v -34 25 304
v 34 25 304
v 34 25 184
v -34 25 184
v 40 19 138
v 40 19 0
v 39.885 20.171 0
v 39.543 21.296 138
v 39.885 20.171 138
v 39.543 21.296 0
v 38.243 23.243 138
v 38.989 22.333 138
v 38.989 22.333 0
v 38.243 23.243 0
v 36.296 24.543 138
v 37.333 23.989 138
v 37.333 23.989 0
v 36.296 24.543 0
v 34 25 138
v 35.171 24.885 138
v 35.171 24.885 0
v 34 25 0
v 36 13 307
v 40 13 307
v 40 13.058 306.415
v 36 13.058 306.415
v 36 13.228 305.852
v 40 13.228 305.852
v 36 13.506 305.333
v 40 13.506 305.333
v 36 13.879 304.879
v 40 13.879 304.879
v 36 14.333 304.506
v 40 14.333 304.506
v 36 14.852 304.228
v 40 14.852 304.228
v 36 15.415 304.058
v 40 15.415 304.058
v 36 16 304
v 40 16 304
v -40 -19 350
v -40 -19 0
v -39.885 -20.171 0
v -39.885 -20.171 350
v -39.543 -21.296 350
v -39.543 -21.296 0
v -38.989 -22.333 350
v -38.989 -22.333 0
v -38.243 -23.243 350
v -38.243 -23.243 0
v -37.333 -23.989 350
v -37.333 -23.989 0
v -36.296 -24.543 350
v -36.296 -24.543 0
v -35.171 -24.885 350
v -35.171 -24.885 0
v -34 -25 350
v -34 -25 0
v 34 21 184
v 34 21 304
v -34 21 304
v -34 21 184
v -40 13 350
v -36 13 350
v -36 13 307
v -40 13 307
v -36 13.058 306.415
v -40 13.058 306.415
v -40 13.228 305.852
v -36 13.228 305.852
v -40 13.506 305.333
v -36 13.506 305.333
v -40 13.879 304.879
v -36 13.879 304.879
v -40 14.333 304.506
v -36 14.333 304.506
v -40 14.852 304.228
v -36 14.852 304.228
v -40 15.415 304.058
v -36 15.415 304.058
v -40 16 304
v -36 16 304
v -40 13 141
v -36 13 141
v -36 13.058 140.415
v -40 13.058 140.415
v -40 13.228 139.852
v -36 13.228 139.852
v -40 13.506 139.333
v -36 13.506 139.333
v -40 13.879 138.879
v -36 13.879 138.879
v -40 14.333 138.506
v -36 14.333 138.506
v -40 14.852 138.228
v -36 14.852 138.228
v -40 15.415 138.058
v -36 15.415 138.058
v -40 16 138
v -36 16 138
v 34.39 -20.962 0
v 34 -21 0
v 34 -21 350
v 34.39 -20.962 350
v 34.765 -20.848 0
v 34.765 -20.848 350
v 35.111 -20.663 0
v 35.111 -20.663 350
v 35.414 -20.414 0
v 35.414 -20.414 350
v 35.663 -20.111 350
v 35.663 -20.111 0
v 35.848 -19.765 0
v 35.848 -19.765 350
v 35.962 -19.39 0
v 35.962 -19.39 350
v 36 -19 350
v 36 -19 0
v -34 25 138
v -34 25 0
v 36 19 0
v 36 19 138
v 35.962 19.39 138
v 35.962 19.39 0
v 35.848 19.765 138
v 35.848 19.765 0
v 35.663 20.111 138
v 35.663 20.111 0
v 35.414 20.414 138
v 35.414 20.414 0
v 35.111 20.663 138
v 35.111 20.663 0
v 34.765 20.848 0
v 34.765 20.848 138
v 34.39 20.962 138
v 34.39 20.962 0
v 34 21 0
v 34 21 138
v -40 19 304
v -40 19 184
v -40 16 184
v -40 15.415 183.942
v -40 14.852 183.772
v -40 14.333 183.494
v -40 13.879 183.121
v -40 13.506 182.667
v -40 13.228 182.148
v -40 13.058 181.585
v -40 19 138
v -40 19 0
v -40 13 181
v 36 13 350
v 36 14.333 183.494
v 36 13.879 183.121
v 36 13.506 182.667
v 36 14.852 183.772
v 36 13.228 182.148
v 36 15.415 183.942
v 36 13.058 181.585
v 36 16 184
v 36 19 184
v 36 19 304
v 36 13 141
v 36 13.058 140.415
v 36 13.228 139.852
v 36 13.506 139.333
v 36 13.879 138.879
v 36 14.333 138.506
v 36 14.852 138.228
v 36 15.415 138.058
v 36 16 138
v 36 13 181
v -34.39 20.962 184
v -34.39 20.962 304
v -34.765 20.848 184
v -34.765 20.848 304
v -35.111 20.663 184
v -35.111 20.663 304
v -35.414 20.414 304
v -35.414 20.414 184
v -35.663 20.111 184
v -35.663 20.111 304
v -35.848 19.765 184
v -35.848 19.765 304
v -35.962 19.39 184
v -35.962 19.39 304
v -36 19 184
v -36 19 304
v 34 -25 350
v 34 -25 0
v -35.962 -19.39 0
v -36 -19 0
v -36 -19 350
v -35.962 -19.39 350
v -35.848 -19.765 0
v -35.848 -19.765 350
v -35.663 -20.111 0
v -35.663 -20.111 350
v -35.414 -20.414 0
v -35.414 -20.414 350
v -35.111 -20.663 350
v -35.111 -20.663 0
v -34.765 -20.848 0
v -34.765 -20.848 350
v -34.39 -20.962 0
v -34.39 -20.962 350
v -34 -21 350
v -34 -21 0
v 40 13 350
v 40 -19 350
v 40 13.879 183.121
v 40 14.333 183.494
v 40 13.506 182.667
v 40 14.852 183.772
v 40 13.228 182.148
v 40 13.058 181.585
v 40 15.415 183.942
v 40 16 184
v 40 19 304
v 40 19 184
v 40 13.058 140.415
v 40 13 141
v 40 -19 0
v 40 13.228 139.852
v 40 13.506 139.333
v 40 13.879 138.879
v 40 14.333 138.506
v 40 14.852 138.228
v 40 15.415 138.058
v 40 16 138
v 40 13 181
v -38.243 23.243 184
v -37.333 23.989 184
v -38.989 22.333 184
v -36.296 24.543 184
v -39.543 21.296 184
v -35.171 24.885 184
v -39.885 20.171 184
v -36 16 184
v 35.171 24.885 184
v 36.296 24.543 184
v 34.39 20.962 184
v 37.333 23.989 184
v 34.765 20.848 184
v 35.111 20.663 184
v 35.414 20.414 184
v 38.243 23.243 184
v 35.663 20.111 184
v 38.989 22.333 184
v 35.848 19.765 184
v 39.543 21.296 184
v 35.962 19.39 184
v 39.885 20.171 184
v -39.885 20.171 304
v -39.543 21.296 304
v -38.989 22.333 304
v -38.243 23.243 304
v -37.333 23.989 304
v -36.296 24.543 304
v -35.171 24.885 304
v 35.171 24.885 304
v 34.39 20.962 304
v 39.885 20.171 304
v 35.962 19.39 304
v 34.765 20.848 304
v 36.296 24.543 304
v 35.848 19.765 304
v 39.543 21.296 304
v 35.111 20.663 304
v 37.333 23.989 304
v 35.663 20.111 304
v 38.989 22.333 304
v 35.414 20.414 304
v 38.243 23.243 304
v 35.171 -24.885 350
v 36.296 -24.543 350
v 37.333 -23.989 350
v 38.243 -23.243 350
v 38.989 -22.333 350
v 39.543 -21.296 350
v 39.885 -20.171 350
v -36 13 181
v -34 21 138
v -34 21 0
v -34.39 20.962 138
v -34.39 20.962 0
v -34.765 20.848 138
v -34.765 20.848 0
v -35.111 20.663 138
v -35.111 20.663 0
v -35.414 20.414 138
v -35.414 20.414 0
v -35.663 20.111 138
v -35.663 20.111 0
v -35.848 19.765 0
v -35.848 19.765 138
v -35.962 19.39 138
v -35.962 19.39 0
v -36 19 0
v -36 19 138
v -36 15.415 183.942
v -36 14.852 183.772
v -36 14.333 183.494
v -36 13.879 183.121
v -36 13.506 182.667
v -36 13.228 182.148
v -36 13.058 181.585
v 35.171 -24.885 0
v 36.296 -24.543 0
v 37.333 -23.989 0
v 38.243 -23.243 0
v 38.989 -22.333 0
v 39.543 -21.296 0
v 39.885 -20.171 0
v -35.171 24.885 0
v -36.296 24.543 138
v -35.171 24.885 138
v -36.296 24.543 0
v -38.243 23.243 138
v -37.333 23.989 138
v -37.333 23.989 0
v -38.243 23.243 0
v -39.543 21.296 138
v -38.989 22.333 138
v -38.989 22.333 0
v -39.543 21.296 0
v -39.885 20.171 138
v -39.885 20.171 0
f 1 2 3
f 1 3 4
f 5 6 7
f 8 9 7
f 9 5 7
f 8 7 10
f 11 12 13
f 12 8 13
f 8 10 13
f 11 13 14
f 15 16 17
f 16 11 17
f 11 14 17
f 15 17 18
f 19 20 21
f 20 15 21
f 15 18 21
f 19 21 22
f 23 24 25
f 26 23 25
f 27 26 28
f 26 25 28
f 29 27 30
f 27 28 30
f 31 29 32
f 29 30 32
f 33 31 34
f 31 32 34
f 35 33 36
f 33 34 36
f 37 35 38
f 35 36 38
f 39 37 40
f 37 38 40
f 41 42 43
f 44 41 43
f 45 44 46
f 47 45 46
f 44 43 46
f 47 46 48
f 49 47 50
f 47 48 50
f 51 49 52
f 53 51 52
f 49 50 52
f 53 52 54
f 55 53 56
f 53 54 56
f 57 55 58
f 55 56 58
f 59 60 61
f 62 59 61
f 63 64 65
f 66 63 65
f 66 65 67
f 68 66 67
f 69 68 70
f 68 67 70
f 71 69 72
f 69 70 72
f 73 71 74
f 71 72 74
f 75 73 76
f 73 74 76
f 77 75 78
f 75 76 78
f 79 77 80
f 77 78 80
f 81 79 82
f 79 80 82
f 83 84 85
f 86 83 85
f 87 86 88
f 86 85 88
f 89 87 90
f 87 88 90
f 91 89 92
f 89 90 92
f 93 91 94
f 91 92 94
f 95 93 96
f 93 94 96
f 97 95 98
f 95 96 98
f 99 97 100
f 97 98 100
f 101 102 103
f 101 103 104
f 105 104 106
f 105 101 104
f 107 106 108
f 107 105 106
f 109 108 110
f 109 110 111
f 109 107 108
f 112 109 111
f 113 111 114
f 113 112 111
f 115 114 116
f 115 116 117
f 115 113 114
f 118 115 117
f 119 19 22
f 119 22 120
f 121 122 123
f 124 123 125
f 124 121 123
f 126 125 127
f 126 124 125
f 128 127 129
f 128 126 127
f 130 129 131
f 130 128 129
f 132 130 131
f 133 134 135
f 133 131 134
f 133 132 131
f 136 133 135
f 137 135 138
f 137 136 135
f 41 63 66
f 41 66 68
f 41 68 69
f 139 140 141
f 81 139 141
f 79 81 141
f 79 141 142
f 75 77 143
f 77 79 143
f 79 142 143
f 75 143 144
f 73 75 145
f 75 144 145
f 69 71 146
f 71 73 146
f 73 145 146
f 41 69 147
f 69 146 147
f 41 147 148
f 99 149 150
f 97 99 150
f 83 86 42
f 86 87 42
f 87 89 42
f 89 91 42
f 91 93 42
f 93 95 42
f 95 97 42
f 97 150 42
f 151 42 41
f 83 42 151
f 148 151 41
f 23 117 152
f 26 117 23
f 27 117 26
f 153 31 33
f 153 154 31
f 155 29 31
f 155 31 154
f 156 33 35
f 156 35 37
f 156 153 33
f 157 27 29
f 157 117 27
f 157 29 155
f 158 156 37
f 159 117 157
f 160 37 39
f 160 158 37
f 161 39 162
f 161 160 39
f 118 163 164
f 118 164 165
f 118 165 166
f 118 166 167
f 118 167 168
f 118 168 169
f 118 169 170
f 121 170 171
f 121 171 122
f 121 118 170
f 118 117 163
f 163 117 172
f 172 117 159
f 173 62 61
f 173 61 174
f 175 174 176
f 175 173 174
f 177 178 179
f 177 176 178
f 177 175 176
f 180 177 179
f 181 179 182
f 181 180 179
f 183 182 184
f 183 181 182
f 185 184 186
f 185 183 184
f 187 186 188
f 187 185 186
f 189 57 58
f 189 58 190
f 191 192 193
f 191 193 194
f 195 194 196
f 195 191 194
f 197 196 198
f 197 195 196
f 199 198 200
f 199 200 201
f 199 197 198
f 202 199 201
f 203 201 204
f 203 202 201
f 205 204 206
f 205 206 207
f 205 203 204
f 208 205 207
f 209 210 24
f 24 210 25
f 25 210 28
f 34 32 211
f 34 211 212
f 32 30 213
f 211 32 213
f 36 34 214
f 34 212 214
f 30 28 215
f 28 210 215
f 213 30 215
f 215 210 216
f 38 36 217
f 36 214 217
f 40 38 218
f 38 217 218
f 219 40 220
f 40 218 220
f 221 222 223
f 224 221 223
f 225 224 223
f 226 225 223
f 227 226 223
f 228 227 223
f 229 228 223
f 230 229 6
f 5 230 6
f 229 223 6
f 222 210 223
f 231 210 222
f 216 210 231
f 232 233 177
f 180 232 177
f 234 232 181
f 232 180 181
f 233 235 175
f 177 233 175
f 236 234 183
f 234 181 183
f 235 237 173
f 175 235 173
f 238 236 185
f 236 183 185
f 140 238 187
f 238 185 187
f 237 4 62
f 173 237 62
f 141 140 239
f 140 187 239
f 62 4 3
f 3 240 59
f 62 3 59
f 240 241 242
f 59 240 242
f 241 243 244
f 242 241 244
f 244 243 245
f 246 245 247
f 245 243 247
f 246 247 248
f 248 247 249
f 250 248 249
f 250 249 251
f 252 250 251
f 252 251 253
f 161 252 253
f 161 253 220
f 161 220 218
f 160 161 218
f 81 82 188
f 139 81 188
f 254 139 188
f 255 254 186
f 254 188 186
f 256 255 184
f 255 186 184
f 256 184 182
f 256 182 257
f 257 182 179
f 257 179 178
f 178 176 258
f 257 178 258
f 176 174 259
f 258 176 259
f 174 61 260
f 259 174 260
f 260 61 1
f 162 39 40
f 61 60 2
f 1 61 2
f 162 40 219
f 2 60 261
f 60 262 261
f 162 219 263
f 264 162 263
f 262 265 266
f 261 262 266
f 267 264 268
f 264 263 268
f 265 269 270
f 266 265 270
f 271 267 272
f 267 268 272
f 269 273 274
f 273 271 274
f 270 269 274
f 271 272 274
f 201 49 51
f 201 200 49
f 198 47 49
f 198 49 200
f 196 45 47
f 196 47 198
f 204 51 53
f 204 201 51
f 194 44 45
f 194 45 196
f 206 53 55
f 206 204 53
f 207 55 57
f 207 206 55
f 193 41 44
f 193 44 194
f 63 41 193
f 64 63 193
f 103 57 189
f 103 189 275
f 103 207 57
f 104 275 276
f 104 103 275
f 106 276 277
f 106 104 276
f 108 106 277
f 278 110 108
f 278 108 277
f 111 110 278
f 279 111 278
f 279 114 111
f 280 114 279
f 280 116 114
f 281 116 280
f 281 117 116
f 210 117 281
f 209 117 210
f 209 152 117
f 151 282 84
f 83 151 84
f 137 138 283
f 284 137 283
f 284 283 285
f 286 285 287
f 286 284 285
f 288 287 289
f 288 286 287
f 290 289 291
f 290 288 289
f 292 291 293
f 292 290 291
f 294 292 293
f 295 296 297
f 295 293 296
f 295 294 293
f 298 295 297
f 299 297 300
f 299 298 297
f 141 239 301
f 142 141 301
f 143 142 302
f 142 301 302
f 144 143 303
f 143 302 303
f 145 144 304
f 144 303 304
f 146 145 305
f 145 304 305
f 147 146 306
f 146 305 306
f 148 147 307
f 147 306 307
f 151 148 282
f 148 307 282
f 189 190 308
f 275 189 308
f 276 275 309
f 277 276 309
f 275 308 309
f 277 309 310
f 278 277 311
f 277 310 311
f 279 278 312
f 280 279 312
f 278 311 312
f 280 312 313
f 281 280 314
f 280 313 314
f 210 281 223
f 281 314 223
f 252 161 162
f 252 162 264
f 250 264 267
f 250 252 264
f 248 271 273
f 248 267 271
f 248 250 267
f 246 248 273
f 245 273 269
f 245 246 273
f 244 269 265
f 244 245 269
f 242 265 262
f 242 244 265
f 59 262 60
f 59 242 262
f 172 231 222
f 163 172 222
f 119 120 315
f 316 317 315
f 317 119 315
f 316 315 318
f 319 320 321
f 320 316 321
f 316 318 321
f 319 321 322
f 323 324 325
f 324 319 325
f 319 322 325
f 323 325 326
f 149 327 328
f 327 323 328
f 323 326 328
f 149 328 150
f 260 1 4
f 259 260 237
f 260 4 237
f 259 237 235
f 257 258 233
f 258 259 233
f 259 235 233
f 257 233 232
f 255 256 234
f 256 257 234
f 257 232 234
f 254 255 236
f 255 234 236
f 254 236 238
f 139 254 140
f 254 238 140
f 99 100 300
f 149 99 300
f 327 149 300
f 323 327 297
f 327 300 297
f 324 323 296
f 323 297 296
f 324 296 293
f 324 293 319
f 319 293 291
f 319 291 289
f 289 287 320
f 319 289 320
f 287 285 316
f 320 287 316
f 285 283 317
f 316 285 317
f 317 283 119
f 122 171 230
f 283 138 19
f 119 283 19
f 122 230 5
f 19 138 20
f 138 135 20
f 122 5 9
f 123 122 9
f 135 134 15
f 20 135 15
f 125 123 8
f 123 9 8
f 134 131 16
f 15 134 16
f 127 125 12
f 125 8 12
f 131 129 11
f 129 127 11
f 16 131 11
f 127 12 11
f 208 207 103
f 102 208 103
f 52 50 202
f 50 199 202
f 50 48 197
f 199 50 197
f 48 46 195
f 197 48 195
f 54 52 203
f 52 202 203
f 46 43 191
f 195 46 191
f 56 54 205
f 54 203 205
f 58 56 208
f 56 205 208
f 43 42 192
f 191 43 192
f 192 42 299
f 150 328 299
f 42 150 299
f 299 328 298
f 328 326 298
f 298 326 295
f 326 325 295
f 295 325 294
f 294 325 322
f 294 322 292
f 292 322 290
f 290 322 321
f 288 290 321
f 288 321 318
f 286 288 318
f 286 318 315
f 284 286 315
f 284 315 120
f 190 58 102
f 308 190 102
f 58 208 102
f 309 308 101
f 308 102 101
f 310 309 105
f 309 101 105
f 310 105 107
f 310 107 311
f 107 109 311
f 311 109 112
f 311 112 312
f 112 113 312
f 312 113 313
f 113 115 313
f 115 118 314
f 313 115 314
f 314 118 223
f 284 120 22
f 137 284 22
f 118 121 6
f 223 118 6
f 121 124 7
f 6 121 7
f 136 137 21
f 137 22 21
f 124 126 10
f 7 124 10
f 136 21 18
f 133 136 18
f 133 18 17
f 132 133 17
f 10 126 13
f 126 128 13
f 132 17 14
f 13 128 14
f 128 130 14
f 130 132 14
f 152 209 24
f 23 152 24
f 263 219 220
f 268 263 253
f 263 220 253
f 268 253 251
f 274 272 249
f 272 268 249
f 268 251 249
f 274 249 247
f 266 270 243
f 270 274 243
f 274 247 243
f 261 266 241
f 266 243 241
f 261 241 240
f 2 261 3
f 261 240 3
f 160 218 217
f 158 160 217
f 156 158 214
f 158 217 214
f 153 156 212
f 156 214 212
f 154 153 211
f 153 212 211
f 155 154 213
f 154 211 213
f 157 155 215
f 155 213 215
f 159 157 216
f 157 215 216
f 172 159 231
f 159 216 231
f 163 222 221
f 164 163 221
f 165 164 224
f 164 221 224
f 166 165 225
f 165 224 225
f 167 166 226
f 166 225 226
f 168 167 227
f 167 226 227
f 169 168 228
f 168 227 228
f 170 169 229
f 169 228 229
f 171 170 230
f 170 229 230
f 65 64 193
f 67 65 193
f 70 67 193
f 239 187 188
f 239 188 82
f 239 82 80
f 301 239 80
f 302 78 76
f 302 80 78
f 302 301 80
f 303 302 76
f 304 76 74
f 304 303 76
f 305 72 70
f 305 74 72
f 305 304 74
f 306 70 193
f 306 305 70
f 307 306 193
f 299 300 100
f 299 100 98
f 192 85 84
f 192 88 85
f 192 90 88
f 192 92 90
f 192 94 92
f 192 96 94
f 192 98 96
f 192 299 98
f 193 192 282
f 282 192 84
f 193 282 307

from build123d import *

# Parameters (mm, degrees)
EXTRUDE_1_DEPTH     = 350
CUT_EXTRUDE_1_DEPTH = 360.895818259


with BuildPart() as part:
    # Эскиз1 → Бобышка-Вытянуть1 (new body)
    with BuildSketch(Plane.XY):
        with BuildLine():
            Line((-34, -25), (34, -25))
            ThreePointArc((34, -25), (38.242640687, -23.242640687), (40, -19))
            Line((40, -19), (40, 19))
            ThreePointArc((40, 19), (38.242640687, 23.242640687), (34, 25))
            Line((34, 25), (-34, 25))
            ThreePointArc((-34, 25), (-38.242640687, 23.242640687), (-40, 19))
            Line((-40, 19), (-40, -19))
            ThreePointArc((-40, -19), (-38.242640687, -23.242640687), (-34, -25))
        make_face()
        with BuildLine():
            Line((-34, -21), (34, -21))
            ThreePointArc((34, -21), (35.414213562, -20.414213562), (36, -19))
            Line((36, -19), (36, 19))
            ThreePointArc((36, 19), (35.414213562, 20.414213562), (34, 21))
            Line((34, 21), (-34, 21))
            ThreePointArc((-34, 21), (-35.414213562, 20.414213562), (-36, 19))
            Line((-36, 19), (-36, -19))
            ThreePointArc((-36, -19), (-35.414213562, -20.414213562), (-34, -21))
        make_face(mode=Mode.SUBTRACT)
    extrude(amount=EXTRUDE_1_DEPTH)

    # Эскиз2 → Вырез-Вытянуть1 (cut, through all)
    with BuildSketch(Plane(origin=(40, 0, 0), x_dir=(0, 0, -1), z_dir=(1, 0, 0))):
        with BuildLine():
            Line((-350, 13), (-307, 13))
            ThreePointArc((-307, 13), (-304.878679656, 13.878679656), (-304, 16))
            Line((-304, 16), (-304, 25))
            Line((-304, 25), (-350, 25))
            Line((-350, 25), (-350, 13))
        make_face()
        with BuildLine():
            Line((-181, 13), (-141, 13))
            ThreePointArc((-141, 13), (-138.878679656, 13.878679656), (-138, 16))
            Line((-138, 16), (-138, 25))
            Line((-138, 25), (-184, 25))
            Line((-184, 25), (-184, 16))
            ThreePointArc((-184, 16), (-183.121320344, 13.878679656), (-181, 13))
        make_face()
    extrude(amount=-CUT_EXTRUDE_1_DEPTH, mode=Mode.SUBTRACT)


solid = part.part
